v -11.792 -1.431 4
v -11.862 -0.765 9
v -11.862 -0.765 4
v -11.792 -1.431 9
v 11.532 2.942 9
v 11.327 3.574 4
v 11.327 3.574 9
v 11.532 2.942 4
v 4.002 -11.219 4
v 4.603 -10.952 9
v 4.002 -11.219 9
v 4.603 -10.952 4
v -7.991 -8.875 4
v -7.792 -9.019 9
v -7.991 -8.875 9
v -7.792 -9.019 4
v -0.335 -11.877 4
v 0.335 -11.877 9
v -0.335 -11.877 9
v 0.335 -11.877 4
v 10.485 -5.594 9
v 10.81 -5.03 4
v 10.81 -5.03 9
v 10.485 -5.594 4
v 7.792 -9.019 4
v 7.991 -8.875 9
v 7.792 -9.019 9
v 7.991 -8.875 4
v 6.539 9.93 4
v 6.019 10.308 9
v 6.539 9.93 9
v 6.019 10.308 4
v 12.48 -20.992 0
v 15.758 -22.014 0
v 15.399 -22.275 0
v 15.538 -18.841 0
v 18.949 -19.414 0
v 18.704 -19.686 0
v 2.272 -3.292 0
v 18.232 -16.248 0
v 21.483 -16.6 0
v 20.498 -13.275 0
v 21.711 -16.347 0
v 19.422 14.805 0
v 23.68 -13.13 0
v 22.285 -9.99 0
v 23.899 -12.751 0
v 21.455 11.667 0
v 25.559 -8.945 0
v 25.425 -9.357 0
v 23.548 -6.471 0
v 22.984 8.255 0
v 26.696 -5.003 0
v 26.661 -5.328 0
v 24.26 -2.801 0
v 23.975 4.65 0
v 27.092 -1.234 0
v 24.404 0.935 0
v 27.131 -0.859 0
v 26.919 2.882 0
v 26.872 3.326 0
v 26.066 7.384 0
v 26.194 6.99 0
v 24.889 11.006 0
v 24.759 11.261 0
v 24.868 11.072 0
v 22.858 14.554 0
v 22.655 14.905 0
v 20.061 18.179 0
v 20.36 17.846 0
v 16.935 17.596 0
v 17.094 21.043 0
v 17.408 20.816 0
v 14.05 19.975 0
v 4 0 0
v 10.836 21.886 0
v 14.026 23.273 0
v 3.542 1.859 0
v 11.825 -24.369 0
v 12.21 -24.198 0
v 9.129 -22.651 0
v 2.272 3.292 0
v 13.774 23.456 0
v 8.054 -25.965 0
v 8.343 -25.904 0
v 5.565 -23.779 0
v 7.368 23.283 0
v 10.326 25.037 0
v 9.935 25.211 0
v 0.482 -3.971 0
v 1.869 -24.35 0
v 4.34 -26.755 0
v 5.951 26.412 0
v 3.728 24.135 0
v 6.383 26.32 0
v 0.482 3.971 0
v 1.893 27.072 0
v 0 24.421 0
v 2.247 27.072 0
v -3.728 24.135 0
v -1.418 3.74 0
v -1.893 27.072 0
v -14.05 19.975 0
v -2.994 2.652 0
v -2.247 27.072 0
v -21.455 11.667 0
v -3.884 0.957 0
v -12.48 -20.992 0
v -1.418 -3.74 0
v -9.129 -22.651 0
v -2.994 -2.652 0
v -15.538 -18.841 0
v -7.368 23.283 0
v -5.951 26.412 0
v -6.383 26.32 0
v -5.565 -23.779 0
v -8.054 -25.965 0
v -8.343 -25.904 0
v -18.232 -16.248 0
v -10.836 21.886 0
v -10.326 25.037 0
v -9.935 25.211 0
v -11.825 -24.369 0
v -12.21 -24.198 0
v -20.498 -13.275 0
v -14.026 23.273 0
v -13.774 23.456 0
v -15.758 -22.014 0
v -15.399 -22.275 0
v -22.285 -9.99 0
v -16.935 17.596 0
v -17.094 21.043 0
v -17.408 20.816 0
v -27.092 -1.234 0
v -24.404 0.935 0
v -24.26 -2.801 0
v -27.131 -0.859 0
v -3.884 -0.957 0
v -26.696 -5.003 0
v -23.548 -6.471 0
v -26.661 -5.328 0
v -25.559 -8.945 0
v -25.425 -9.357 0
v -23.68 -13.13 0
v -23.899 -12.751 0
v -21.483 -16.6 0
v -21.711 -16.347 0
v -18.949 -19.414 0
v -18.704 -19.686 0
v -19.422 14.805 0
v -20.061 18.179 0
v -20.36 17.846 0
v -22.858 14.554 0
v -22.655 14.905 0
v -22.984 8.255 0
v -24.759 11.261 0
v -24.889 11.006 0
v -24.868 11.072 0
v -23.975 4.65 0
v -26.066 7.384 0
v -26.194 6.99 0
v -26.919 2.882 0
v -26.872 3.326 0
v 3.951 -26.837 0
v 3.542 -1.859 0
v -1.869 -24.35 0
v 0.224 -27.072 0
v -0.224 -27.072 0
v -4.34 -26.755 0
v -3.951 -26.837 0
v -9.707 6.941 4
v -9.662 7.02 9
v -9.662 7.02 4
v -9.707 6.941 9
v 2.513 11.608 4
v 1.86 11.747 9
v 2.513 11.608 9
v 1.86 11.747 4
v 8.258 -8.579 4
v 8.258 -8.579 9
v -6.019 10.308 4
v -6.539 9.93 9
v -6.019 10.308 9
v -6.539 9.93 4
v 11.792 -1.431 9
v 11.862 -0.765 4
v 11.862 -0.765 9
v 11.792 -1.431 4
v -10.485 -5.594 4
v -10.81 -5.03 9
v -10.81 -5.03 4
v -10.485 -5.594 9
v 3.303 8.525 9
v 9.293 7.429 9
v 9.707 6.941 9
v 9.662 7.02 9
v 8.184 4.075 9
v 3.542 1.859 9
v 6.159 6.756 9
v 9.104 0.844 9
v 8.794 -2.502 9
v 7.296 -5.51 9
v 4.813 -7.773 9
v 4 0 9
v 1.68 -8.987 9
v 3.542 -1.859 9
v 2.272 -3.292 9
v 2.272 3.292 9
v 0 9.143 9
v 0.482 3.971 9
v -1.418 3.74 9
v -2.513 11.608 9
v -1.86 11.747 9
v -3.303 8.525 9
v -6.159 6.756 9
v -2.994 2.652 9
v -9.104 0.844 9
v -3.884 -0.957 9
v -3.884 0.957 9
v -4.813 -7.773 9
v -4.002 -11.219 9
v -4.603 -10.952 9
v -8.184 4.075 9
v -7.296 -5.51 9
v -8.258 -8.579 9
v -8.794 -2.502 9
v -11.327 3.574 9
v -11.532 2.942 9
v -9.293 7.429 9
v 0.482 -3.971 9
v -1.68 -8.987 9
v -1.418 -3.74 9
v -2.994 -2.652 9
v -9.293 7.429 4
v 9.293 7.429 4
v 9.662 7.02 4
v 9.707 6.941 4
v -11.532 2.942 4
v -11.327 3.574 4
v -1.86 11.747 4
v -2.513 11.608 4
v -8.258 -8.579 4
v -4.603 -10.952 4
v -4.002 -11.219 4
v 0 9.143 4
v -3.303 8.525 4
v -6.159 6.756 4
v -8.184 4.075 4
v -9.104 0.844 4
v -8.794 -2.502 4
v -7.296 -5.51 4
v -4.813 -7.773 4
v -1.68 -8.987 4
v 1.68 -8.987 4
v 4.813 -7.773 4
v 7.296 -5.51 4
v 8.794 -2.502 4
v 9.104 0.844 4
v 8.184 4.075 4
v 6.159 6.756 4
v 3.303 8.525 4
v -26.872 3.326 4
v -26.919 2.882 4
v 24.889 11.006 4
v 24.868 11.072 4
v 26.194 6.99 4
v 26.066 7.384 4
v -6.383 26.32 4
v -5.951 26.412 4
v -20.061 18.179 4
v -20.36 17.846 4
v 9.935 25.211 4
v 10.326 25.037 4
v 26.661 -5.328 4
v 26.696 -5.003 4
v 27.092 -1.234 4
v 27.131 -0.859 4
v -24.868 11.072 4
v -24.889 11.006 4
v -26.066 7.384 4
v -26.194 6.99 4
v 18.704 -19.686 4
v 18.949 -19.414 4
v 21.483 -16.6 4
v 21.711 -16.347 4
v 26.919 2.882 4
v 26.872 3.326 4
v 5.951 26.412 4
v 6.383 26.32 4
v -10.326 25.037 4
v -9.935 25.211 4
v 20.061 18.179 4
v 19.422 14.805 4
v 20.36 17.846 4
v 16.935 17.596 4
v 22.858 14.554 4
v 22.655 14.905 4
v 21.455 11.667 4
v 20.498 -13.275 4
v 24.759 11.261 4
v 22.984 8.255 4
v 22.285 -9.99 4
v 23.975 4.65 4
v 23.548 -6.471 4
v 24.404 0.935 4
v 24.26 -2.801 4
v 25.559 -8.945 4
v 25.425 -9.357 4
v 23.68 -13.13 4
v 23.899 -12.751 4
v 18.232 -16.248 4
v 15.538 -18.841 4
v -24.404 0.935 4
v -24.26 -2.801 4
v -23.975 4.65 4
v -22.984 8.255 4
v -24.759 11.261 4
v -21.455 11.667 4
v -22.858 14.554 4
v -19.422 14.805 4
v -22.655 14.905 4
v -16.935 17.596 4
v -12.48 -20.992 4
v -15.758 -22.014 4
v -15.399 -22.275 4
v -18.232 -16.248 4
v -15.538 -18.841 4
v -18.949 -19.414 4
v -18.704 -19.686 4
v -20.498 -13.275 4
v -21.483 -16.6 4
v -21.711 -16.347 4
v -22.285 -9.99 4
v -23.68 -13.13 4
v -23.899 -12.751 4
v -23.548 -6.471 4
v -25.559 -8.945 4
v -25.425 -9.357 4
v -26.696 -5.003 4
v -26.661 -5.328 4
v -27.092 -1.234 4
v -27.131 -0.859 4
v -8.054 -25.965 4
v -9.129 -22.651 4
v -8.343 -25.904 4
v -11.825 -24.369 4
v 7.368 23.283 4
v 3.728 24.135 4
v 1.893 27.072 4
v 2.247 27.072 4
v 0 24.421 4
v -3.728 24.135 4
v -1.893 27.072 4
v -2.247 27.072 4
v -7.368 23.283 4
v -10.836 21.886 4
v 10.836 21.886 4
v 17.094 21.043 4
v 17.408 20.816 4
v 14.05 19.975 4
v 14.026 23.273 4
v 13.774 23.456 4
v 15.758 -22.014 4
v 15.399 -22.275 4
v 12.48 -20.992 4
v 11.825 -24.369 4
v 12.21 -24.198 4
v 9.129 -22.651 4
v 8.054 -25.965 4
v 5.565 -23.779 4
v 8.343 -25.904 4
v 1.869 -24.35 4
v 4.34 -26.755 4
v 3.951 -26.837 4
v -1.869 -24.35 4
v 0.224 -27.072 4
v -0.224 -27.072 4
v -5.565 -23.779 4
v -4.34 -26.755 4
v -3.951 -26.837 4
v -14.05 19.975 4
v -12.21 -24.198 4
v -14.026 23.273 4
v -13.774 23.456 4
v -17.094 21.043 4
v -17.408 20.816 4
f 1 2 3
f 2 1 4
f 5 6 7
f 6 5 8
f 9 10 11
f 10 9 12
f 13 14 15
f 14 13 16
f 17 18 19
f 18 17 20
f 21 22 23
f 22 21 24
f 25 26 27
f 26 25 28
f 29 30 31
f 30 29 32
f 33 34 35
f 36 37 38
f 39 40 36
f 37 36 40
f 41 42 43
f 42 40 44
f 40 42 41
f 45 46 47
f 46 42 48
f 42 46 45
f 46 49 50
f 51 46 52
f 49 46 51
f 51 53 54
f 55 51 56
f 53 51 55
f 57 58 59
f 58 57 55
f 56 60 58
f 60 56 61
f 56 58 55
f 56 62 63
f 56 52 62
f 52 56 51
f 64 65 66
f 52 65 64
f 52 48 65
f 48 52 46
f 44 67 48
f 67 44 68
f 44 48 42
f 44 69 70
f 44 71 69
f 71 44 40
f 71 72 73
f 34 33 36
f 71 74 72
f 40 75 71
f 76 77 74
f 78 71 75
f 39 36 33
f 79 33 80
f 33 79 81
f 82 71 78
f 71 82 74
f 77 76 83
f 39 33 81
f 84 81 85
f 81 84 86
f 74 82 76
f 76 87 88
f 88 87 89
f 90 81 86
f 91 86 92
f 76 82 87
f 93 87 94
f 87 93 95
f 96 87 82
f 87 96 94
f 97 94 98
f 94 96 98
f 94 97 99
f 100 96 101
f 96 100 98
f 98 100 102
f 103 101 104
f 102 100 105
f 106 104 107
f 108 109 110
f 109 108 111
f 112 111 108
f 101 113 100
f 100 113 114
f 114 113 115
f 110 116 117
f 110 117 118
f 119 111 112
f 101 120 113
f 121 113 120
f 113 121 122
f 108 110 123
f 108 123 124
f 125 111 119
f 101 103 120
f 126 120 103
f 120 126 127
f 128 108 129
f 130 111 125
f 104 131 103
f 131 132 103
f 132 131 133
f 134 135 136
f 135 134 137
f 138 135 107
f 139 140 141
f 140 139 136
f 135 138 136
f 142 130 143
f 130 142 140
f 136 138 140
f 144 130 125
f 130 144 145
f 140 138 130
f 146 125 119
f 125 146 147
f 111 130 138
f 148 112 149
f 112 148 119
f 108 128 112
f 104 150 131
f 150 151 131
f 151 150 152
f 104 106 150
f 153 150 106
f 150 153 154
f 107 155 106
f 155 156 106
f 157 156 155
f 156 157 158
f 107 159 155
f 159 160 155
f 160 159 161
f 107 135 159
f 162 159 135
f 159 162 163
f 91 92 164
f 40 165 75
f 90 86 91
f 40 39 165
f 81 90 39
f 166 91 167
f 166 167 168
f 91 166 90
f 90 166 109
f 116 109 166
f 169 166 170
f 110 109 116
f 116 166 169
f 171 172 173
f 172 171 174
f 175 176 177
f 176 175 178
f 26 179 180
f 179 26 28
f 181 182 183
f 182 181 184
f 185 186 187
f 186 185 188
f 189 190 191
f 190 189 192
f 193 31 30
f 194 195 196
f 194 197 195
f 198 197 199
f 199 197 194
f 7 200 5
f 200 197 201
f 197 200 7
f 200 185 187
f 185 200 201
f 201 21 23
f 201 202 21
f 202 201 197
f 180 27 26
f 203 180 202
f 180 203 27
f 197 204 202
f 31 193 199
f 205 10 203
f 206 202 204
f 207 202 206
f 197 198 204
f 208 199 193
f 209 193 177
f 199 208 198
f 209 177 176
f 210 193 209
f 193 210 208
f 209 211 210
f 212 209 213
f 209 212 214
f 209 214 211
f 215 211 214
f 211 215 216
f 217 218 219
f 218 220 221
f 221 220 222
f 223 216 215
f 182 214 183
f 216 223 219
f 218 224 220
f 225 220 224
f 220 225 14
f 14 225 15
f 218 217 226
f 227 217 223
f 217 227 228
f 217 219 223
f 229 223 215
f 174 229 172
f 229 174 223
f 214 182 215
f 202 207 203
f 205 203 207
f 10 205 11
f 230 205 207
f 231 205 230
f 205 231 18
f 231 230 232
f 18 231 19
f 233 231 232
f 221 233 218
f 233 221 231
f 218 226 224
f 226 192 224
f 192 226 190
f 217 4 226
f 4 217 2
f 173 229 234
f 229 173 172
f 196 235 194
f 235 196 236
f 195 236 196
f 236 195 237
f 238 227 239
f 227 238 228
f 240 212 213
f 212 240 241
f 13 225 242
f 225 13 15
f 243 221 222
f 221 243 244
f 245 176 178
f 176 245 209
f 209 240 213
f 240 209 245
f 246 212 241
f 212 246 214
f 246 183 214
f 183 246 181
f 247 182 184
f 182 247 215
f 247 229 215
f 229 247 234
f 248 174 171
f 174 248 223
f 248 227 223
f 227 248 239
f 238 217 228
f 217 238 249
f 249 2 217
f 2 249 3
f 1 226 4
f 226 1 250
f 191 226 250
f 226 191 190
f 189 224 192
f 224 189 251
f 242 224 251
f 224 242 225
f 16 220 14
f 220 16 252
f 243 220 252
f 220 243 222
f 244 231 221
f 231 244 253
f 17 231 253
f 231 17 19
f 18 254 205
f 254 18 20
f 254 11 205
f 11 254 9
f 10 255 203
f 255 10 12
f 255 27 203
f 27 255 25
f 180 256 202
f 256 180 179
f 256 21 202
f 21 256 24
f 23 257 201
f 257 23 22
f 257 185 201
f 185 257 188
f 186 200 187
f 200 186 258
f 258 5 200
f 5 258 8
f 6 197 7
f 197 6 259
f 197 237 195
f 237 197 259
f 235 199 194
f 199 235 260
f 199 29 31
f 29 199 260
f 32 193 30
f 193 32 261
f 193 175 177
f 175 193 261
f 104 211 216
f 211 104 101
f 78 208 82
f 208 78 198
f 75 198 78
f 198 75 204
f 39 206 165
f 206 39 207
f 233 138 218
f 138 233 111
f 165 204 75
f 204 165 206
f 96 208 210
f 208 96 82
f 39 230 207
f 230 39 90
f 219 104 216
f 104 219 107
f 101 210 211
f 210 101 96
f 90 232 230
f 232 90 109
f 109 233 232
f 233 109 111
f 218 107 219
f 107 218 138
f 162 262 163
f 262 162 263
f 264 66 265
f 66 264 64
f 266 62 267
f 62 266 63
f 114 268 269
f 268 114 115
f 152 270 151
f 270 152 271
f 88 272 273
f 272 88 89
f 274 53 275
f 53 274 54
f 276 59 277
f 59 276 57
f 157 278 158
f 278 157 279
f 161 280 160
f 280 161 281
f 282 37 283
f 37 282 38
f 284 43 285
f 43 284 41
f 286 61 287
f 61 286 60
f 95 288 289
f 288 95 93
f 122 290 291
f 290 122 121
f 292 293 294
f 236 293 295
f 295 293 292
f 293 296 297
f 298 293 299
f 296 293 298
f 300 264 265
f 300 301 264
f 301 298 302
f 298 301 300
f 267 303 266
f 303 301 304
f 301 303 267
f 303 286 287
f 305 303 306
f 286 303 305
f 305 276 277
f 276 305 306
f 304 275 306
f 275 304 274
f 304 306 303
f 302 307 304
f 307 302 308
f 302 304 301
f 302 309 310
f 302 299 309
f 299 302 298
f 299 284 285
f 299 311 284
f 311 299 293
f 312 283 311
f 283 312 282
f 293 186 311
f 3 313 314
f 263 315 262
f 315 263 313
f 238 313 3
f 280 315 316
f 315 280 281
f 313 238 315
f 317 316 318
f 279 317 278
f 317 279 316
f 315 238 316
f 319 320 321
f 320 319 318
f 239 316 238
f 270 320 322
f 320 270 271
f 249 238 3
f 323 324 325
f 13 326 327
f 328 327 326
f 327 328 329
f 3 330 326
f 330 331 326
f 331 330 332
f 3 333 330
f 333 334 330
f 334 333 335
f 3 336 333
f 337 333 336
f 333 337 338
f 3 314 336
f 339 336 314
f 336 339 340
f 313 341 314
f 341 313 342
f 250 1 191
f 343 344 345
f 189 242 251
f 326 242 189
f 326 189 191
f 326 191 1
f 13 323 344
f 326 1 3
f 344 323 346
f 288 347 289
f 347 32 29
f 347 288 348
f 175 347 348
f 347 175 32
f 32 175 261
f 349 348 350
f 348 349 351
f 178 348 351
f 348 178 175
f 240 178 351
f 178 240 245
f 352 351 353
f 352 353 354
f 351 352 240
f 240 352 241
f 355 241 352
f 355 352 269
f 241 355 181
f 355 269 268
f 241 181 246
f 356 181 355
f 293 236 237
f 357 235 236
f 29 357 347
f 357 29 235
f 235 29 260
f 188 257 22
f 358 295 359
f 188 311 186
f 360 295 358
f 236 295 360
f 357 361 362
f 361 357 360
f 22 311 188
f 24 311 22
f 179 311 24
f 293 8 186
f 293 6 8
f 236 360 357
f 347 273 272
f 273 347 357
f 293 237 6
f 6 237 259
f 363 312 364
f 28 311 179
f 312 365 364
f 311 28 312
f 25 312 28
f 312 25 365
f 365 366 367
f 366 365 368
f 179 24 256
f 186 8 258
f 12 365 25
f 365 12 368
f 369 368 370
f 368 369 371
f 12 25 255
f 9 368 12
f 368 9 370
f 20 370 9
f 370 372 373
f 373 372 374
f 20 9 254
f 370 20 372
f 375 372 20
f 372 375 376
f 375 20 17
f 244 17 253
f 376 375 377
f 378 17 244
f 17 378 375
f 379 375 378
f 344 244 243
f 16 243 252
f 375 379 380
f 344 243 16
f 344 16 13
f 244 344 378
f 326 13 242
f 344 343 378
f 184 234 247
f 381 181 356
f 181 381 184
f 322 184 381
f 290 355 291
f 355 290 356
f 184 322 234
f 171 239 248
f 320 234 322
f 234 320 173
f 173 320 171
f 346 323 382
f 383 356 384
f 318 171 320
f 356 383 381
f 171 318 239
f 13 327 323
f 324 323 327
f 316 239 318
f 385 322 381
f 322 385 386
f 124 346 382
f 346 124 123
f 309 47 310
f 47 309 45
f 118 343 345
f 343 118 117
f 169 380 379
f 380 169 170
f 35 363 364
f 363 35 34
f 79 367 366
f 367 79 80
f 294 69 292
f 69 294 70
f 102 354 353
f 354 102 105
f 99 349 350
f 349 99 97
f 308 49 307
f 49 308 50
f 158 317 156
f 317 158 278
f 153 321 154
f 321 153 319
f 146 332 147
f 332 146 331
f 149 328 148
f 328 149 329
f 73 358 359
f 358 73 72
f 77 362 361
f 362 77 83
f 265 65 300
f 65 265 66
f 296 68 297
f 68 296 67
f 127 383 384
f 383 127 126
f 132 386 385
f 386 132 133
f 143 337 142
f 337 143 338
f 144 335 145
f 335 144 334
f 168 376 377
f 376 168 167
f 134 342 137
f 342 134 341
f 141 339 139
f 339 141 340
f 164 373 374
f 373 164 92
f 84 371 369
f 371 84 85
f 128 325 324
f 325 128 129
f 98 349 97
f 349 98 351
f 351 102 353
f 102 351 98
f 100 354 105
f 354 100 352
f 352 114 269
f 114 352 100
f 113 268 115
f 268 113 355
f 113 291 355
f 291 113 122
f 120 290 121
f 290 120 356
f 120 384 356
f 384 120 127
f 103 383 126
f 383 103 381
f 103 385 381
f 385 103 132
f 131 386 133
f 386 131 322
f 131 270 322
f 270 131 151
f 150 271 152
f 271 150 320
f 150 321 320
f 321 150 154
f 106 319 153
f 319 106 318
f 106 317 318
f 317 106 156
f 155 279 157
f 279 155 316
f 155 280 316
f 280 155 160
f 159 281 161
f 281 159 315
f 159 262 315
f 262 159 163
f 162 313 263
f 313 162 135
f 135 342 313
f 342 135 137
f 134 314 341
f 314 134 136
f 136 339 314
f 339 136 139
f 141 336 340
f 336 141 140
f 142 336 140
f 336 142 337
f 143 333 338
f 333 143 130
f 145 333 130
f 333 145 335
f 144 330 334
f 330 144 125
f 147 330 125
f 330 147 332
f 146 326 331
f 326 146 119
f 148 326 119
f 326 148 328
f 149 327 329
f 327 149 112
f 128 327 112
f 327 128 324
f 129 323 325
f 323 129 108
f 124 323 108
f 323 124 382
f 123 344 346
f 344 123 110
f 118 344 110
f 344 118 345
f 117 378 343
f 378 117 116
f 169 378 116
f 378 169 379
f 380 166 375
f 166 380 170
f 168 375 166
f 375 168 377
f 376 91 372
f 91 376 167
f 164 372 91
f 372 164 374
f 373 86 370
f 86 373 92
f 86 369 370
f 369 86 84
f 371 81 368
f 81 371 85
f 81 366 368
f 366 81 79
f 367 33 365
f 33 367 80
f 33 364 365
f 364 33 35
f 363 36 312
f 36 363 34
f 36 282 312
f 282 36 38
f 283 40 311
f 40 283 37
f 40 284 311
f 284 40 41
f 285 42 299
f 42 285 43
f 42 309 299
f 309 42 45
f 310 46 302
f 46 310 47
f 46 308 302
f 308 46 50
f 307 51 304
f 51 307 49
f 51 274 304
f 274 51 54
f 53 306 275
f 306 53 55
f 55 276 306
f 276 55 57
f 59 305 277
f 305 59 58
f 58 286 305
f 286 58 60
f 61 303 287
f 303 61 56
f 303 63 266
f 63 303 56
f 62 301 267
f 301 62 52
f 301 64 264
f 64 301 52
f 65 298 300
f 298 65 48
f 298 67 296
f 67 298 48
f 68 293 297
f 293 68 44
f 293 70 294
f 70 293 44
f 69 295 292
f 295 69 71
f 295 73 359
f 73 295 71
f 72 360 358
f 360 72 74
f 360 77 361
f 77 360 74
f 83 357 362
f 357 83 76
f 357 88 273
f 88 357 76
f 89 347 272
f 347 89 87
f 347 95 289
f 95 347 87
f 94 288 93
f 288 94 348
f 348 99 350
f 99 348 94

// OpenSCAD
union() {
	union() {
		difference() {
			cylinder(h = 9, r = 11.9425361302);
			translate(v = [0, 0, -0.5000000000]) {
				rotate(a = 0.0000000000, v = [0, 0, 1]) {
					translate(v = [0, 11.9425361302, 0]) {
						linear_extrude(height = 10) {
							polygon(paths = [[0, 1, 2, 3]], points = [[-2.0000000000, 0], [0, 1], [2.0000000000, 0], [0, -2.8000000000]]);
						}
					}
				}
			}
			translate(v = [0, 0, -0.5000000000]) {
				rotate(a = 21.1764705882, v = [0, 0, 1]) {
					translate(v = [0, 11.9425361302, 0]) {
						linear_extrude(height = 10) {
							polygon(paths = [[0, 1, 2, 3]], points = [[-2.0000000000, 0], [0, 1], [2.0000000000, 0], [0, -2.8000000000]]);
						}
					}
				}
			}
			translate(v = [0, 0, -0.5000000000]) {
				rotate(a = 42.3529411765, v = [0, 0, 1]) {
					translate(v = [0, 11.9425361302, 0]) {
						linear_extrude(height = 10) {
							polygon(paths = [[0, 1, 2, 3]], points = [[-2.0000000000, 0], [0, 1], [2.0000000000, 0], [0, -2.8000000000]]);
						}
					}
				}
			}
			translate(v = [0, 0, -0.5000000000]) {
				rotate(a = 63.5294117647, v = [0, 0, 1]) {
					translate(v = [0, 11.9425361302, 0]) {
						linear_extrude(height = 10) {
							polygon(paths = [[0, 1, 2, 3]], points = [[-2.0000000000, 0], [0, 1], [2.0000000000, 0], [0, -2.8000000000]]);
						}
					}
				}
			}
			translate(v = [0, 0, -0.5000000000]) {
				rotate(a = 84.7058823529, v = [0, 0, 1]) {
					translate(v = [0, 11.9425361302, 0]) {
						linear_extrude(height = 10) {
							polygon(paths = [[0, 1, 2, 3]], points = [[-2.0000000000, 0], [0, 1], [2.0000000000, 0], [0, -2.8000000000]]);
						}
					}
				}
			}
			translate(v = [0, 0, -0.5000000000]) {
				rotate(a = 105.8823529412, v = [0, 0, 1]) {
					translate(v = [0, 11.9425361302, 0]) {
						linear_extrude(height = 10) {
							polygon(paths = [[0, 1, 2, 3]], points = [[-2.0000000000, 0], [0, 1], [2.0000000000, 0], [0, -2.8000000000]]);
						}
					}
				}
			}
			translate(v = [0, 0, -0.5000000000]) {
				rotate(a = 127.0588235294, v = [0, 0, 1]) {
					translate(v = [0, 11.9425361302, 0]) {
						linear_extrude(height = 10) {
							polygon(paths = [[0, 1, 2, 3]], points = [[-2.0000000000, 0], [0, 1], [2.0000000000, 0], [0, -2.8000000000]]);
						}
					}
				}
			}
			translate(v = [0, 0, -0.5000000000]) {
				rotate(a = 148.2352941176, v = [0, 0, 1]) {
					translate(v = [0, 11.9425361302, 0]) {
						linear_extrude(height = 10) {
							polygon(paths = [[0, 1, 2, 3]], points = [[-2.0000000000, 0], [0, 1], [2.0000000000, 0], [0, -2.8000000000]]);
						}
					}
				}
			}
			translate(v = [0, 0, -0.5000000000]) {
				rotate(a = 169.4117647059, v = [0, 0, 1]) {
					translate(v = [0, 11.9425361302, 0]) {
						linear_extrude(height = 10) {
							polygon(paths = [[0, 1, 2, 3]], points = [[-2.0000000000, 0], [0, 1], [2.0000000000, 0], [0, -2.8000000000]]);
						}
					}
				}
			}
			translate(v = [0, 0, -0.5000000000]) {
				rotate(a = 190.5882352941, v = [0, 0, 1]) {
					translate(v = [0, 11.9425361302, 0]) {
						linear_extrude(height = 10) {
							polygon(paths = [[0, 1, 2, 3]], points = [[-2.0000000000, 0], [0, 1], [2.0000000000, 0], [0, -2.8000000000]]);
						}
					}
				}
			}
			translate(v = [0, 0, -0.5000000000]) {
				rotate(a = 211.7647058824, v = [0, 0, 1]) {
					translate(v = [0, 11.9425361302, 0]) {
						linear_extrude(height = 10) {
							polygon(paths = [[0, 1, 2, 3]], points = [[-2.0000000000, 0], [0, 1], [2.0000000000, 0], [0, -2.8000000000]]);
						}
					}
				}
			}
			translate(v = [0, 0, -0.5000000000]) {
				rotate(a = 232.9411764706, v = [0, 0, 1]) {
					translate(v = [0, 11.9425361302, 0]) {
						linear_extrude(height = 10) {
							polygon(paths = [[0, 1, 2, 3]], points = [[-2.0000000000, 0], [0, 1], [2.0000000000, 0], [0, -2.8000000000]]);
						}
					}
				}
			}
			translate(v = [0, 0, -0.5000000000]) {
				rotate(a = 254.1176470588, v = [0, 0, 1]) {
					translate(v = [0, 11.9425361302, 0]) {
						linear_extrude(height = 10) {
							polygon(paths = [[0, 1, 2, 3]], points = [[-2.0000000000, 0], [0, 1], [2.0000000000, 0], [0, -2.8000000000]]);
						}
					}
				}
			}
			translate(v = [0, 0, -0.5000000000]) {
				rotate(a = 275.2941176471, v = [0, 0, 1]) {
					translate(v = [0, 11.9425361302, 0]) {
						linear_extrude(height = 10) {
							polygon(paths = [[0, 1, 2, 3]], points = [[-2.0000000000, 0], [0, 1], [2.0000000000, 0], [0, -2.8000000000]]);
						}
					}
				}
			}
			translate(v = [0, 0, -0.5000000000]) {
				rotate(a = 296.4705882353, v = [0, 0, 1]) {
					translate(v = [0, 11.9425361302, 0]) {
						linear_extrude(height = 10) {
							polygon(paths = [[0, 1, 2, 3]], points = [[-2.0000000000, 0], [0, 1], [2.0000000000, 0], [0, -2.8000000000]]);
						}
					}
				}
			}
			translate(v = [0, 0, -0.5000000000]) {
				rotate(a = 317.6470588235, v = [0, 0, 1]) {
					translate(v = [0, 11.9425361302, 0]) {
						linear_extrude(height = 10) {
							polygon(paths = [[0, 1, 2, 3]], points = [[-2.0000000000, 0], [0, 1], [2.0000000000, 0], [0, -2.8000000000]]);
						}
					}
				}
			}
			translate(v = [0, 0, -0.5000000000]) {
				rotate(a = 338.8235294118, v = [0, 0, 1]) {
					translate(v = [0, 11.9425361302, 0]) {
						linear_extrude(height = 10) {
							polygon(paths = [[0, 1, 2, 3]], points = [[-2.0000000000, 0], [0, 1], [2.0000000000, 0], [0, -2.8000000000]]);
						}
					}
				}
			}
			translate(v = [0, 0, -1]) {
				cylinder(h = 11, r = 4);
			}
		}
		difference() {
			cylinder(h = 4, r = 27.2214106671);
			translate(v = [0, 0, -0.5000000000]) {
				rotate(a = 0.0000000000, v = [0, 0, 1]) {
					translate(v = [0, 27.2214106671, 0]) {
						linear_extrude(height = 5) {
							polygon(paths = [[0, 1, 2, 3]], points = [[-2.0000000000, 0], [0, 1], [2.0000000000, 0], [0, -2.8000000000]]);
						}
					}
				}
			}
			translate(v = [0, 0, -0.5000000000]) {
				rotate(a = 8.7804878049, v = [0, 0, 1]) {
					translate(v = [0, 27.2214106671, 0]) {
						linear_extrude(height = 5) {
							polygon(paths = [[0, 1, 2, 3]], points = [[-2.0000000000, 0], [0, 1], [2.0000000000, 0], [0, -2.8000000000]]);
						}
					}
				}
			}
			translate(v = [0, 0, -0.5000000000]) {
				rotate(a = 17.5609756098, v = [0, 0, 1]) {
					translate(v = [0, 27.2214106671, 0]) {
						linear_extrude(height = 5) {
							polygon(paths = [[0, 1, 2, 3]], points = [[-2.0000000000, 0], [0, 1], [2.0000000000, 0], [0, -2.8000000000]]);
						}
					}
				}
			}
			translate(v = [0, 0, -0.5000000000]) {
				rotate(a = 26.3414634146, v = [0, 0, 1]) {
					translate(v = [0, 27.2214106671, 0]) {
						linear_extrude(height = 5) {
							polygon(paths = [[0, 1, 2, 3]], points = [[-2.0000000000, 0], [0, 1], [2.0000000000, 0], [0, -2.8000000000]]);
						}
					}
				}
			}
			translate(v = [0, 0, -0.5000000000]) {
				rotate(a = 35.1219512195, v = [0, 0, 1]) {
					translate(v = [0, 27.2214106671, 0]) {
						linear_extrude(height = 5) {
							polygon(paths = [[0, 1, 2, 3]], points = [[-2.0000000000, 0], [0, 1], [2.0000000000, 0], [0, -2.8000000000]]);
						}
					}
				}
			}
			translate(v = [0, 0, -0.5000000000]) {
				rotate(a = 43.9024390244, v = [0, 0, 1]) {
					translate(v = [0, 27.2214106671, 0]) {
						linear_extrude(height = 5) {
							polygon(paths = [[0, 1, 2, 3]], points = [[-2.0000000000, 0], [0, 1], [2.0000000000, 0], [0, -2.8000000000]]);
						}
					}
				}
			}
			translate(v = [0, 0, -0.5000000000]) {
				rotate(a = 52.6829268293, v = [0, 0, 1]) {
					translate(v = [0, 27.2214106671, 0]) {
						linear_extrude(height = 5) {
							polygon(paths = [[0, 1, 2, 3]], points = [[-2.0000000000, 0], [0, 1], [2.0000000000, 0], [0, -2.8000000000]]);
						}
					}
				}
			}
			translate(v = [0, 0, -0.5000000000]) {
				rotate(a = 61.4634146341, v = [0, 0, 1]) {
					translate(v = [0, 27.2214106671, 0]) {
						linear_extrude(height = 5) {
							polygon(paths = [[0, 1, 2, 3]], points = [[-2.0000000000, 0], [0, 1], [2.0000000000, 0], [0, -2.8000000000]]);
						}
					}
				}
			}
			translate(v = [0, 0, -0.5000000000]) {
				rotate(a = 70.2439024390, v = [0, 0, 1]) {
					translate(v = [0, 27.2214106671, 0]) {
						linear_extrude(height = 5) {
							polygon(paths = [[0, 1, 2, 3]], points = [[-2.0000000000, 0], [0, 1], [2.0000000000, 0], [0, -2.8000000000]]);
						}
					}
				}
			}
			translate(v = [0, 0, -0.5000000000]) {
				rotate(a = 79.0243902439, v = [0, 0, 1]) {
					translate(v = [0, 27.2214106671, 0]) {
						linear_extrude(height = 5) {
							polygon(paths = [[0, 1, 2, 3]], points = [[-2.0000000000, 0], [0, 1], [2.0000000000, 0], [0, -2.8000000000]]);
						}
					}
				}
			}
			translate(v = [0, 0, -0.5000000000]) {
				rotate(a = 87.8048780488, v = [0, 0, 1]) {
					translate(v = [0, 27.2214106671, 0]) {
						linear_extrude(height = 5) {
							polygon(paths = [[0, 1, 2, 3]], points = [[-2.0000000000, 0], [0, 1], [2.0000000000, 0], [0, -2.8000000000]]);
						}
					}
				}
			}
			translate(v = [0, 0, -0.5000000000]) {
				rotate(a = 96.5853658537, v = [0, 0, 1]) {
					translate(v = [0, 27.2214106671, 0]) {
						linear_extrude(height = 5) {
							polygon(paths = [[0, 1, 2, 3]], points = [[-2.0000000000, 0], [0, 1], [2.0000000000, 0], [0, -2.8000000000]]);
						}
					}
				}
			}
			translate(v = [0, 0, -0.5000000000]) {
				rotate(a = 105.3658536585, v = [0, 0, 1]) {
					translate(v = [0, 27.2214106671, 0]) {
						linear_extrude(height = 5) {
							polygon(paths = [[0, 1, 2, 3]], points = [[-2.0000000000, 0], [0, 1], [2.0000000000, 0], [0, -2.8000000000]]);
						}
					}
				}
			}
			translate(v = [0, 0, -0.5000000000]) {
				rotate(a = 114.1463414634, v = [0, 0, 1]) {
					translate(v = [0, 27.2214106671, 0]) {
						linear_extrude(height = 5) {
							polygon(paths = [[0, 1, 2, 3]], points = [[-2.0000000000, 0], [0, 1], [2.0000000000, 0], [0, -2.8000000000]]);
						}
					}
				}
			}
			translate(v = [0, 0, -0.5000000000]) {
				rotate(a = 122.9268292683, v = [0, 0, 1]) {
					translate(v = [0, 27.2214106671, 0]) {
						linear_extrude(height = 5) {
							polygon(paths = [[0, 1, 2, 3]], points = [[-2.0000000000, 0], [0, 1], [2.0000000000, 0], [0, -2.8000000000]]);
						}
					}
				}
			}
			translate(v = [0, 0, -0.5000000000]) {
				rotate(a = 131.7073170732, v = [0, 0, 1]) {
					translate(v = [0, 27.2214106671, 0]) {
						linear_extrude(height = 5) {
							polygon(paths = [[0, 1, 2, 3]], points = [[-2.0000000000, 0], [0, 1], [2.0000000000, 0], [0, -2.8000000000]]);
						}
					}
				}
			}
			translate(v = [0, 0, -0.5000000000]) {
				rotate(a = 140.4878048780, v = [0, 0, 1]) {
					translate(v = [0, 27.2214106671, 0]) {
						linear_extrude(height = 5) {
							polygon(paths = [[0, 1, 2, 3]], points = [[-2.0000000000, 0], [0, 1], [2.0000000000, 0], [0, -2.8000000000]]);
						}
					}
				}
			}
			translate(v = [0, 0, -0.5000000000]) {
				rotate(a = 149.2682926829, v = [0, 0, 1]) {
					translate(v = [0, 27.2214106671, 0]) {
						linear_extrude(height = 5) {
							polygon(paths = [[0, 1, 2, 3]], points = [[-2.0000000000, 0], [0, 1], [2.0000000000, 0], [0, -2.8000000000]]);
						}
					}
				}
			}
			translate(v = [0, 0, -0.5000000000]) {
				rotate(a = 158.0487804878, v = [0, 0, 1]) {
					translate(v = [0, 27.2214106671, 0]) {
						linear_extrude(height = 5) {
							polygon(paths = [[0, 1, 2, 3]], points = [[-2.0000000000, 0], [0, 1], [2.0000000000, 0], [0, -2.8000000000]]);
						}
					}
				}
			}
			translate(v = [0, 0, -0.5000000000]) {
				rotate(a = 166.8292682927, v = [0, 0, 1]) {
					translate(v = [0, 27.2214106671, 0]) {
						linear_extrude(height = 5) {
							polygon(paths = [[0, 1, 2, 3]], points = [[-2.0000000000, 0], [0, 1], [2.0000000000, 0], [0, -2.8000000000]]);
						}
					}
				}
			}
			translate(v = [0, 0, -0.5000000000]) {
				rotate(a = 175.6097560976, v = [0, 0, 1]) {
					translate(v = [0, 27.2214106671, 0]) {
						linear_extrude(height = 5) {
							polygon(paths = [[0, 1, 2, 3]], points = [[-2.0000000000, 0], [0, 1], [2.0000000000, 0], [0, -2.8000000000]]);
						}
					}
				}
			}
			translate(v = [0, 0, -0.5000000000]) {
				rotate(a = 184.3902439024, v = [0, 0, 1]) {
					translate(v = [0, 27.2214106671, 0]) {
						linear_extrude(height = 5) {
							polygon(paths = [[0, 1, 2, 3]], points = [[-2.0000000000, 0], [0, 1], [2.0000000000, 0], [0, -2.8000000000]]);
						}
					}
				}
			}
			translate(v = [0, 0, -0.5000000000]) {
				rotate(a = 193.1707317073, v = [0, 0, 1]) {
					translate(v = [0, 27.2214106671, 0]) {
						linear_extrude(height = 5) {
							polygon(paths = [[0, 1, 2, 3]], points = [[-2.0000000000, 0], [0, 1], [2.0000000000, 0], [0, -2.8000000000]]);
						}
					}
				}
			}
			translate(v = [0, 0, -0.5000000000]) {
				rotate(a = 201.9512195122, v = [0, 0, 1]) {
					translate(v = [0, 27.2214106671, 0]) {
						linear_extrude(height = 5) {
							polygon(paths = [[0, 1, 2, 3]], points = [[-2.0000000000, 0], [0, 1], [2.0000000000, 0], [0, -2.8000000000]]);
						}
					}
				}
			}
			translate(v = [0, 0, -0.5000000000]) {
				rotate(a = 210.7317073171, v = [0, 0, 1]) {
					translate(v = [0, 27.2214106671, 0]) {
						linear_extrude(height = 5) {
							polygon(paths = [[0, 1, 2, 3]], points = [[-2.0000000000, 0], [0, 1], [2.0000000000, 0], [0, -2.8000000000]]);
						}
					}
				}
			}
			translate(v = [0, 0, -0.5000000000]) {
				rotate(a = 219.5121951220, v = [0, 0, 1]) {
					translate(v = [0, 27.2214106671, 0]) {
						linear_extrude(height = 5) {
							polygon(paths = [[0, 1, 2, 3]], points = [[-2.0000000000, 0], [0, 1], [2.0000000000, 0], [0, -2.8000000000]]);
						}
					}
				}
			}
			translate(v = [0, 0, -0.5000000000]) {
				rotate(a = 228.2926829268, v = [0, 0, 1]) {
					translate(v = [0, 27.2214106671, 0]) {
						linear_extrude(height = 5) {
							polygon(paths = [[0, 1, 2, 3]], points = [[-2.0000000000, 0], [0, 1], [2.0000000000, 0], [0, -2.8000000000]]);
						}
					}
				}
			}
			translate(v = [0, 0, -0.5000000000]) {
				rotate(a = 237.0731707317, v = [0, 0, 1]) {
					translate(v = [0, 27.2214106671, 0]) {
						linear_extrude(height = 5) {
							polygon(paths = [[0, 1, 2, 3]], points = [[-2.0000000000, 0], [0, 1], [2.0000000000, 0], [0, -2.8000000000]]);
						}
					}
				}
			}
			translate(v = [0, 0, -0.5000000000]) {
				rotate(a = 245.8536585366, v = [0, 0, 1]) {
					translate(v = [0, 27.2214106671, 0]) {
						linear_extrude(height = 5) {
							polygon(paths = [[0, 1, 2, 3]], points = [[-2.0000000000, 0], [0, 1], [2.0000000000, 0], [0, -2.8000000000]]);
						}
					}
				}
			}
			translate(v = [0, 0, -0.5000000000]) {
				rotate(a = 254.6341463415, v = [0, 0, 1]) {
					translate(v = [0, 27.2214106671, 0]) {
						linear_extrude(height = 5) {
							polygon(paths = [[0, 1, 2, 3]], points = [[-2.0000000000, 0], [0, 1], [2.0000000000, 0], [0, -2.8000000000]]);
						}
					}
				}
			}
			translate(v = [0, 0, -0.5000000000]) {
				rotate(a = 263.4146341463, v = [0, 0, 1]) {
					translate(v = [0, 27.2214106671, 0]) {
						linear_extrude(height = 5) {
							polygon(paths = [[0, 1, 2, 3]], points = [[-2.0000000000, 0], [0, 1], [2.0000000000, 0], [0, -2.8000000000]]);
						}
					}
				}
			}
			translate(v = [0, 0, -0.5000000000]) {
				rotate(a = 272.1951219512, v = [0, 0, 1]) {
					translate(v = [0, 27.2214106671, 0]) {
						linear_extrude(height = 5) {
							polygon(paths = [[0, 1, 2, 3]], points = [[-2.0000000000, 0], [0, 1], [2.0000000000, 0], [0, -2.8000000000]]);
						}
					}
				}
			}
			translate(v = [0, 0, -0.5000000000]) {
				rotate(a = 280.9756097561, v = [0, 0, 1]) {
					translate(v = [0, 27.2214106671, 0]) {
						linear_extrude(height = 5) {
							polygon(paths = [[0, 1, 2, 3]], points = [[-2.0000000000, 0], [0, 1], [2.0000000000, 0], [0, -2.8000000000]]);
						}
					}
				}
			}
			translate(v = [0, 0, -0.5000000000]) {
				rotate(a = 289.7560975610, v = [0, 0, 1]) {
					translate(v = [0, 27.2214106671, 0]) {
						linear_extrude(height = 5) {
							polygon(paths = [[0, 1, 2, 3]], points = [[-2.0000000000, 0], [0, 1], [2.0000000000, 0], [0, -2.8000000000]]);
						}
					}
				}
			}
			translate(v = [0, 0, -0.5000000000]) {
				rotate(a = 298.5365853659, v = [0, 0, 1]) {
					translate(v = [0, 27.2214106671, 0]) {
						linear_extrude(height = 5) {
							polygon(paths = [[0, 1, 2, 3]], points = [[-2.0000000000, 0], [0, 1], [2.0000000000, 0], [0, -2.8000000000]]);
						}
					}
				}
			}
			translate(v = [0, 0, -0.5000000000]) {
				rotate(a = 307.3170731707, v = [0, 0, 1]) {
					translate(v = [0, 27.2214106671, 0]) {
						linear_extrude(height = 5) {
							polygon(paths = [[0, 1, 2, 3]], points = [[-2.0000000000, 0], [0, 1], [2.0000000000, 0], [0, -2.8000000000]]);
						}
					}
				}
			}
			translate(v = [0, 0, -0.5000000000]) {
				rotate(a = 316.0975609756, v = [0, 0, 1]) {
					translate(v = [0, 27.2214106671, 0]) {
						linear_extrude(height = 5) {
							polygon(paths = [[0, 1, 2, 3]], points = [[-2.0000000000, 0], [0, 1], [2.0000000000, 0], [0, -2.8000000000]]);
						}
					}
				}
			}
			translate(v = [0, 0, -0.5000000000]) {
				rotate(a = 324.8780487805, v = [0, 0, 1]) {
					translate(v = [0, 27.2214106671, 0]) {
						linear_extrude(height = 5) {
							polygon(paths = [[0, 1, 2, 3]], points = [[-2.0000000000, 0], [0, 1], [2.0000000000, 0], [0, -2.8000000000]]);
						}
					}
				}
			}
			translate(v = [0, 0, -0.5000000000]) {
				rotate(a = 333.6585365854, v = [0, 0, 1]) {
					translate(v = [0, 27.2214106671, 0]) {
						linear_extrude(height = 5) {
							polygon(paths = [[0, 1, 2, 3]], points = [[-2.0000000000, 0], [0, 1], [2.0000000000, 0], [0, -2.8000000000]]);
						}
					}
				}
			}
			translate(v = [0, 0, -0.5000000000]) {
				rotate(a = 342.4390243902, v = [0, 0, 1]) {
					translate(v = [0, 27.2214106671, 0]) {
						linear_extrude(height = 5) {
							polygon(paths = [[0, 1, 2, 3]], points = [[-2.0000000000, 0], [0, 1], [2.0000000000, 0], [0, -2.8000000000]]);
						}
					}
				}
			}
			translate(v = [0, 0, -0.5000000000]) {
				rotate(a = 351.2195121951, v = [0, 0, 1]) {
					translate(v = [0, 27.2214106671, 0]) {
						linear_extrude(height = 5) {
							polygon(paths = [[0, 1, 2, 3]], points = [[-2.0000000000, 0], [0, 1], [2.0000000000, 0], [0, -2.8000000000]]);
						}
					}
				}
			}
			translate(v = [0, 0, -1]) {
				cylinder(h = 6, r = 4);
			}
		}
	}
}
